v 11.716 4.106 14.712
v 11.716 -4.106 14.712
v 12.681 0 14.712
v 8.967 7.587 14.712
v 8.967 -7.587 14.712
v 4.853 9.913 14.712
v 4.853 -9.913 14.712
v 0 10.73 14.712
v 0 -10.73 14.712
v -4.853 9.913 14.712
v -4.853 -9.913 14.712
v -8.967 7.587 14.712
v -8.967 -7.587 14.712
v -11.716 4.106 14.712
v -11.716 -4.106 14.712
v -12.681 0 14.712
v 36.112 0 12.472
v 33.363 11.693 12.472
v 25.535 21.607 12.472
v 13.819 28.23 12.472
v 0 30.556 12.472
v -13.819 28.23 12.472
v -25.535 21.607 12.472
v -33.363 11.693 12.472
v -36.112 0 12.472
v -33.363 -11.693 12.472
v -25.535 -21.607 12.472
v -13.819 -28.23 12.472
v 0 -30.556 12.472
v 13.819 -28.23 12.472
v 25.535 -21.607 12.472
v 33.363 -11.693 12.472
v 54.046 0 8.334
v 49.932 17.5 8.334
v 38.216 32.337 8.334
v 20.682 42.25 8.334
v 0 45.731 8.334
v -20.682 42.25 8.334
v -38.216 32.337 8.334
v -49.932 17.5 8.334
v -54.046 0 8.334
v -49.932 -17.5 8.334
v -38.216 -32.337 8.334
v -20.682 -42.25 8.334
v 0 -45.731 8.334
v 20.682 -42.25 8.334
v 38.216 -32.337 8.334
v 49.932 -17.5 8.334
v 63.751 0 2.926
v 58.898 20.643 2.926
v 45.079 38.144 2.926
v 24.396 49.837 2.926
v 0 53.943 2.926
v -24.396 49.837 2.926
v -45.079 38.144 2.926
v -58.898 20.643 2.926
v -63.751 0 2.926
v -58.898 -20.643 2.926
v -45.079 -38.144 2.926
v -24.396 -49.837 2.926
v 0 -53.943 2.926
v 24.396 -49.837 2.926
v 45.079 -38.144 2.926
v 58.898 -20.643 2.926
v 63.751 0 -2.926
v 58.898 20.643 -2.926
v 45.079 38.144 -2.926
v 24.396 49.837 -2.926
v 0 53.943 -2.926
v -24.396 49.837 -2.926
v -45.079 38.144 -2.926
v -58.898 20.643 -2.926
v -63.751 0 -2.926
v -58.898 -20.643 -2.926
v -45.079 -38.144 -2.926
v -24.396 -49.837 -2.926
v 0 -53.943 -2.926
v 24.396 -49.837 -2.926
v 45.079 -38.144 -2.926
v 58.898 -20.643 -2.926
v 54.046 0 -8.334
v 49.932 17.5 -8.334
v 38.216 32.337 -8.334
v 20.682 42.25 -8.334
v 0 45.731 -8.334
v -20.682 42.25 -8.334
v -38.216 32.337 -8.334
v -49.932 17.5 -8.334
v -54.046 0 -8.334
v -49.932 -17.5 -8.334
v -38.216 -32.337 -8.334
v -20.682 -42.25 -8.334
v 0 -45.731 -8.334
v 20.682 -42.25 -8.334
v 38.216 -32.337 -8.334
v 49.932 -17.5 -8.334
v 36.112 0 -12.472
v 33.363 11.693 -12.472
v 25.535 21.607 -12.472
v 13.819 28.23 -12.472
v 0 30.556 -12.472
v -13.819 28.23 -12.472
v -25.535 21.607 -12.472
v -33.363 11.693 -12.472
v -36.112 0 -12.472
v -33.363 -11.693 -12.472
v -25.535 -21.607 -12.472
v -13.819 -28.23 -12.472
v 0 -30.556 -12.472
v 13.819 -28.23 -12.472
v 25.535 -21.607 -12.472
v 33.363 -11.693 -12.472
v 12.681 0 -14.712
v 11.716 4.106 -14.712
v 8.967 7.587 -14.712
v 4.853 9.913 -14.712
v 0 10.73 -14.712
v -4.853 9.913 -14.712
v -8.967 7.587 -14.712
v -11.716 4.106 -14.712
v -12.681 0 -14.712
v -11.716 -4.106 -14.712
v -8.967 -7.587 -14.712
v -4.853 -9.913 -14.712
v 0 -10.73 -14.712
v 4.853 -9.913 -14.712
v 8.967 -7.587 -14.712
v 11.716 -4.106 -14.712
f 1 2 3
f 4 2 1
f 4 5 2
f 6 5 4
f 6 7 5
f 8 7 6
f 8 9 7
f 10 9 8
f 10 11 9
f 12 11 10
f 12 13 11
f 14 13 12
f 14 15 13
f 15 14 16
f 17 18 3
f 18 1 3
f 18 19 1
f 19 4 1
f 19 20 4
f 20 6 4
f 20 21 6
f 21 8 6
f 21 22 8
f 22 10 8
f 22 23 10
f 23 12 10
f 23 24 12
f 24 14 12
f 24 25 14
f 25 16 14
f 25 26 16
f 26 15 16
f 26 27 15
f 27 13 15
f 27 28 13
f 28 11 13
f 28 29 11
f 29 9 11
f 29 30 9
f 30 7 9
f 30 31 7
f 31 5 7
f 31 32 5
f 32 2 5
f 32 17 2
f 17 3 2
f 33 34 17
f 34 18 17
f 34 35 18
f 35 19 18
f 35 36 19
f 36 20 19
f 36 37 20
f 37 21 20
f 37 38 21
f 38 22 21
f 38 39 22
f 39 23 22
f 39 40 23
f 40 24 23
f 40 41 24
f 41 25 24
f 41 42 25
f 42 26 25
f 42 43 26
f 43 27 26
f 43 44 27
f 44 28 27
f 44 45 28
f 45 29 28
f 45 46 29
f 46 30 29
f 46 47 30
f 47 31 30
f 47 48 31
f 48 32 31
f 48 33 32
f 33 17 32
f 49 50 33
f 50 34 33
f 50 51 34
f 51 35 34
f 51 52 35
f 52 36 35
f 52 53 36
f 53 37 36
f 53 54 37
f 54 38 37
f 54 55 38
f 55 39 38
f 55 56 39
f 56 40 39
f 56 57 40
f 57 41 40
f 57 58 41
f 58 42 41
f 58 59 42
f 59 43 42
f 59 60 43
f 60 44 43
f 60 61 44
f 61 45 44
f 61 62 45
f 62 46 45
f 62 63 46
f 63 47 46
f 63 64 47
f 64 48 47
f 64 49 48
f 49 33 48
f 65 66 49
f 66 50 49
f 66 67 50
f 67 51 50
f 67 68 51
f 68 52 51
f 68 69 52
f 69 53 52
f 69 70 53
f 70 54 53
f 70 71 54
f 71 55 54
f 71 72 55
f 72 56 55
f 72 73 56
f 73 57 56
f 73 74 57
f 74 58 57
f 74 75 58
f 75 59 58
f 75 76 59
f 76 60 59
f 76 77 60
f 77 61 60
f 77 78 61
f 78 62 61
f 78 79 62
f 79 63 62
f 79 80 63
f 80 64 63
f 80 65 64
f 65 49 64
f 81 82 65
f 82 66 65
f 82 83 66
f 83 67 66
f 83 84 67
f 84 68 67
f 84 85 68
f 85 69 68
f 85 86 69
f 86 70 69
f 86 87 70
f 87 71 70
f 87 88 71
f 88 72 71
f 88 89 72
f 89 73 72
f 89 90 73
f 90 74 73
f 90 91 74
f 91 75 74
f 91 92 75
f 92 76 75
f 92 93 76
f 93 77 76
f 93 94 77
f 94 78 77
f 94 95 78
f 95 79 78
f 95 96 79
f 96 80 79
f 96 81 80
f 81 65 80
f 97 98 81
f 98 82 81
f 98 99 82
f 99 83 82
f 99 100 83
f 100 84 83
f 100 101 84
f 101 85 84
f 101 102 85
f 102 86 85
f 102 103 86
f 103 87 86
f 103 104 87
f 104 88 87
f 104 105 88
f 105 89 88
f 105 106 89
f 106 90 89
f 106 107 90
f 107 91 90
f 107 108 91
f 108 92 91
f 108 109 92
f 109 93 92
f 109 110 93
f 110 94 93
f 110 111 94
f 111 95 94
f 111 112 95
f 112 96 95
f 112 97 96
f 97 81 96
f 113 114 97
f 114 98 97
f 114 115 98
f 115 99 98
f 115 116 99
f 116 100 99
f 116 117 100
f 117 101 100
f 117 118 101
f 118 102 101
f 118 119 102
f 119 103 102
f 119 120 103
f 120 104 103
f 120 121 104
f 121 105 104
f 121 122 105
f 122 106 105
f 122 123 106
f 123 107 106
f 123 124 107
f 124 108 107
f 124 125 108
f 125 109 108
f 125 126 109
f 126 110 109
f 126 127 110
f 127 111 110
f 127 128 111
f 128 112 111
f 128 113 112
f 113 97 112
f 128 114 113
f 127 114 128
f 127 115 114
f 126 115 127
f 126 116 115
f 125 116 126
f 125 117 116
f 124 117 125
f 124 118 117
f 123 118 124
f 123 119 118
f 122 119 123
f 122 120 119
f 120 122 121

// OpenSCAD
// Generated by SolidPython 1.0.1 on 2020-07-29 00:46:50


scale(v = [13, 11, 3]) {
	sphere(r = 5);
}
/***********************************************
*********      SolidPython code:      **********
************************************************
 
# import packages: SolidPython
from solid import *
from solid.utils import *
from itertools import chain, combinations, permutations


class Resize:

    def __init__(self, scad_file):
        self.scad_file = scad_file
        #self.scad_file = import_scad(scad_file)
        # cone/cylinder param:
        self.r1 = 0
        self.r2 = 0
        self.h = 0
        # rectangular prism param:
        self.w = 0
        self.l = 0
        # ellipse param:
        self.r = 0

    # import OpenScad code (file name corresponds to shape)


    # classify shape + parameters
    def assign(self, param1, param2, param3):
        if self.scad_file == 'cone.scad':
            self.r1 = param1
            self.r2 = param2
            self.h = param3
        elif self.scad_file == 'cylinder.scad':
            self.r1 = param1
            self.r2 = param2
            self.h = param3
        elif self.scad_file == 'rectangularPrism.scad':
            self.h = param1
            self.l = param2
            self.w = param3
        else:
            self.r = param1
            self.h = param2

    # resize parameters
    def iterate(self):
        x = range(3, 20, 2)
        i = 1
        if self.scad_file == 'cone.scad':
            tempList = list(permutations(x, 2))
            for temp in tempList:
                param1 = temp[0]
                param2 = temp[1]
                filepath = 'produced_scad_files/' + 'cone' + str(param1) + '_' + str(param2) + '_' + '.scad'
                scad_render_to_file(cylinder(h=param1, r1=param2, r2=0), filepath)

        elif self.scad_file == 'cylinder.scad':
            tempList = list(permutations(x, 3))
            for temp in tempList:
                param1 = temp[0]
                param2 = temp[1]
                filepath = 'produced_scad_files/' + 'cylinder' + str(param1) + '_' + str(param2) + '_' + '.scad'
                scad_render_to_file(cylinder(h=param1, r1=param2, r2=param2), filepath)

        elif self.scad_file == 'rectangularPrism.scad':
            tempList = list(permutations(x, 3))
            for temp in tempList:
                param1 = temp[0]
                param2 = temp[1]
                param3 = temp[2]
                filepath = 'produced_scad_files/' + 'rectangularPrism' + str(param1) + '_' + str(param2) + '_' + str(
                    param3) + '.scad'
                scad_render_to_file(cube(size=(param1, param2, param3)), filepath)

        elif self.scad_file == 'ellipse.scad':
            tempList = list(permutations(x, 4))
            for temp in tempList:
                param1 = temp[0]
                param2 = temp[1]
                param3 = temp[2]
                param4 = temp[3]
                filepath = 'produced_scad_files/' + 'ellipse' + str(param1) + '_' + str(param2) + '_' + str(param3) + '_' + str(param4) + '.scad'
                scad_render_to_file(scale([param1, param2, param3])(sphere(r=param4)), filepath)

    def render_to_scadfile(self):
        scad_render_to_file(scad, 'example.scad') 
 
************************************************/
